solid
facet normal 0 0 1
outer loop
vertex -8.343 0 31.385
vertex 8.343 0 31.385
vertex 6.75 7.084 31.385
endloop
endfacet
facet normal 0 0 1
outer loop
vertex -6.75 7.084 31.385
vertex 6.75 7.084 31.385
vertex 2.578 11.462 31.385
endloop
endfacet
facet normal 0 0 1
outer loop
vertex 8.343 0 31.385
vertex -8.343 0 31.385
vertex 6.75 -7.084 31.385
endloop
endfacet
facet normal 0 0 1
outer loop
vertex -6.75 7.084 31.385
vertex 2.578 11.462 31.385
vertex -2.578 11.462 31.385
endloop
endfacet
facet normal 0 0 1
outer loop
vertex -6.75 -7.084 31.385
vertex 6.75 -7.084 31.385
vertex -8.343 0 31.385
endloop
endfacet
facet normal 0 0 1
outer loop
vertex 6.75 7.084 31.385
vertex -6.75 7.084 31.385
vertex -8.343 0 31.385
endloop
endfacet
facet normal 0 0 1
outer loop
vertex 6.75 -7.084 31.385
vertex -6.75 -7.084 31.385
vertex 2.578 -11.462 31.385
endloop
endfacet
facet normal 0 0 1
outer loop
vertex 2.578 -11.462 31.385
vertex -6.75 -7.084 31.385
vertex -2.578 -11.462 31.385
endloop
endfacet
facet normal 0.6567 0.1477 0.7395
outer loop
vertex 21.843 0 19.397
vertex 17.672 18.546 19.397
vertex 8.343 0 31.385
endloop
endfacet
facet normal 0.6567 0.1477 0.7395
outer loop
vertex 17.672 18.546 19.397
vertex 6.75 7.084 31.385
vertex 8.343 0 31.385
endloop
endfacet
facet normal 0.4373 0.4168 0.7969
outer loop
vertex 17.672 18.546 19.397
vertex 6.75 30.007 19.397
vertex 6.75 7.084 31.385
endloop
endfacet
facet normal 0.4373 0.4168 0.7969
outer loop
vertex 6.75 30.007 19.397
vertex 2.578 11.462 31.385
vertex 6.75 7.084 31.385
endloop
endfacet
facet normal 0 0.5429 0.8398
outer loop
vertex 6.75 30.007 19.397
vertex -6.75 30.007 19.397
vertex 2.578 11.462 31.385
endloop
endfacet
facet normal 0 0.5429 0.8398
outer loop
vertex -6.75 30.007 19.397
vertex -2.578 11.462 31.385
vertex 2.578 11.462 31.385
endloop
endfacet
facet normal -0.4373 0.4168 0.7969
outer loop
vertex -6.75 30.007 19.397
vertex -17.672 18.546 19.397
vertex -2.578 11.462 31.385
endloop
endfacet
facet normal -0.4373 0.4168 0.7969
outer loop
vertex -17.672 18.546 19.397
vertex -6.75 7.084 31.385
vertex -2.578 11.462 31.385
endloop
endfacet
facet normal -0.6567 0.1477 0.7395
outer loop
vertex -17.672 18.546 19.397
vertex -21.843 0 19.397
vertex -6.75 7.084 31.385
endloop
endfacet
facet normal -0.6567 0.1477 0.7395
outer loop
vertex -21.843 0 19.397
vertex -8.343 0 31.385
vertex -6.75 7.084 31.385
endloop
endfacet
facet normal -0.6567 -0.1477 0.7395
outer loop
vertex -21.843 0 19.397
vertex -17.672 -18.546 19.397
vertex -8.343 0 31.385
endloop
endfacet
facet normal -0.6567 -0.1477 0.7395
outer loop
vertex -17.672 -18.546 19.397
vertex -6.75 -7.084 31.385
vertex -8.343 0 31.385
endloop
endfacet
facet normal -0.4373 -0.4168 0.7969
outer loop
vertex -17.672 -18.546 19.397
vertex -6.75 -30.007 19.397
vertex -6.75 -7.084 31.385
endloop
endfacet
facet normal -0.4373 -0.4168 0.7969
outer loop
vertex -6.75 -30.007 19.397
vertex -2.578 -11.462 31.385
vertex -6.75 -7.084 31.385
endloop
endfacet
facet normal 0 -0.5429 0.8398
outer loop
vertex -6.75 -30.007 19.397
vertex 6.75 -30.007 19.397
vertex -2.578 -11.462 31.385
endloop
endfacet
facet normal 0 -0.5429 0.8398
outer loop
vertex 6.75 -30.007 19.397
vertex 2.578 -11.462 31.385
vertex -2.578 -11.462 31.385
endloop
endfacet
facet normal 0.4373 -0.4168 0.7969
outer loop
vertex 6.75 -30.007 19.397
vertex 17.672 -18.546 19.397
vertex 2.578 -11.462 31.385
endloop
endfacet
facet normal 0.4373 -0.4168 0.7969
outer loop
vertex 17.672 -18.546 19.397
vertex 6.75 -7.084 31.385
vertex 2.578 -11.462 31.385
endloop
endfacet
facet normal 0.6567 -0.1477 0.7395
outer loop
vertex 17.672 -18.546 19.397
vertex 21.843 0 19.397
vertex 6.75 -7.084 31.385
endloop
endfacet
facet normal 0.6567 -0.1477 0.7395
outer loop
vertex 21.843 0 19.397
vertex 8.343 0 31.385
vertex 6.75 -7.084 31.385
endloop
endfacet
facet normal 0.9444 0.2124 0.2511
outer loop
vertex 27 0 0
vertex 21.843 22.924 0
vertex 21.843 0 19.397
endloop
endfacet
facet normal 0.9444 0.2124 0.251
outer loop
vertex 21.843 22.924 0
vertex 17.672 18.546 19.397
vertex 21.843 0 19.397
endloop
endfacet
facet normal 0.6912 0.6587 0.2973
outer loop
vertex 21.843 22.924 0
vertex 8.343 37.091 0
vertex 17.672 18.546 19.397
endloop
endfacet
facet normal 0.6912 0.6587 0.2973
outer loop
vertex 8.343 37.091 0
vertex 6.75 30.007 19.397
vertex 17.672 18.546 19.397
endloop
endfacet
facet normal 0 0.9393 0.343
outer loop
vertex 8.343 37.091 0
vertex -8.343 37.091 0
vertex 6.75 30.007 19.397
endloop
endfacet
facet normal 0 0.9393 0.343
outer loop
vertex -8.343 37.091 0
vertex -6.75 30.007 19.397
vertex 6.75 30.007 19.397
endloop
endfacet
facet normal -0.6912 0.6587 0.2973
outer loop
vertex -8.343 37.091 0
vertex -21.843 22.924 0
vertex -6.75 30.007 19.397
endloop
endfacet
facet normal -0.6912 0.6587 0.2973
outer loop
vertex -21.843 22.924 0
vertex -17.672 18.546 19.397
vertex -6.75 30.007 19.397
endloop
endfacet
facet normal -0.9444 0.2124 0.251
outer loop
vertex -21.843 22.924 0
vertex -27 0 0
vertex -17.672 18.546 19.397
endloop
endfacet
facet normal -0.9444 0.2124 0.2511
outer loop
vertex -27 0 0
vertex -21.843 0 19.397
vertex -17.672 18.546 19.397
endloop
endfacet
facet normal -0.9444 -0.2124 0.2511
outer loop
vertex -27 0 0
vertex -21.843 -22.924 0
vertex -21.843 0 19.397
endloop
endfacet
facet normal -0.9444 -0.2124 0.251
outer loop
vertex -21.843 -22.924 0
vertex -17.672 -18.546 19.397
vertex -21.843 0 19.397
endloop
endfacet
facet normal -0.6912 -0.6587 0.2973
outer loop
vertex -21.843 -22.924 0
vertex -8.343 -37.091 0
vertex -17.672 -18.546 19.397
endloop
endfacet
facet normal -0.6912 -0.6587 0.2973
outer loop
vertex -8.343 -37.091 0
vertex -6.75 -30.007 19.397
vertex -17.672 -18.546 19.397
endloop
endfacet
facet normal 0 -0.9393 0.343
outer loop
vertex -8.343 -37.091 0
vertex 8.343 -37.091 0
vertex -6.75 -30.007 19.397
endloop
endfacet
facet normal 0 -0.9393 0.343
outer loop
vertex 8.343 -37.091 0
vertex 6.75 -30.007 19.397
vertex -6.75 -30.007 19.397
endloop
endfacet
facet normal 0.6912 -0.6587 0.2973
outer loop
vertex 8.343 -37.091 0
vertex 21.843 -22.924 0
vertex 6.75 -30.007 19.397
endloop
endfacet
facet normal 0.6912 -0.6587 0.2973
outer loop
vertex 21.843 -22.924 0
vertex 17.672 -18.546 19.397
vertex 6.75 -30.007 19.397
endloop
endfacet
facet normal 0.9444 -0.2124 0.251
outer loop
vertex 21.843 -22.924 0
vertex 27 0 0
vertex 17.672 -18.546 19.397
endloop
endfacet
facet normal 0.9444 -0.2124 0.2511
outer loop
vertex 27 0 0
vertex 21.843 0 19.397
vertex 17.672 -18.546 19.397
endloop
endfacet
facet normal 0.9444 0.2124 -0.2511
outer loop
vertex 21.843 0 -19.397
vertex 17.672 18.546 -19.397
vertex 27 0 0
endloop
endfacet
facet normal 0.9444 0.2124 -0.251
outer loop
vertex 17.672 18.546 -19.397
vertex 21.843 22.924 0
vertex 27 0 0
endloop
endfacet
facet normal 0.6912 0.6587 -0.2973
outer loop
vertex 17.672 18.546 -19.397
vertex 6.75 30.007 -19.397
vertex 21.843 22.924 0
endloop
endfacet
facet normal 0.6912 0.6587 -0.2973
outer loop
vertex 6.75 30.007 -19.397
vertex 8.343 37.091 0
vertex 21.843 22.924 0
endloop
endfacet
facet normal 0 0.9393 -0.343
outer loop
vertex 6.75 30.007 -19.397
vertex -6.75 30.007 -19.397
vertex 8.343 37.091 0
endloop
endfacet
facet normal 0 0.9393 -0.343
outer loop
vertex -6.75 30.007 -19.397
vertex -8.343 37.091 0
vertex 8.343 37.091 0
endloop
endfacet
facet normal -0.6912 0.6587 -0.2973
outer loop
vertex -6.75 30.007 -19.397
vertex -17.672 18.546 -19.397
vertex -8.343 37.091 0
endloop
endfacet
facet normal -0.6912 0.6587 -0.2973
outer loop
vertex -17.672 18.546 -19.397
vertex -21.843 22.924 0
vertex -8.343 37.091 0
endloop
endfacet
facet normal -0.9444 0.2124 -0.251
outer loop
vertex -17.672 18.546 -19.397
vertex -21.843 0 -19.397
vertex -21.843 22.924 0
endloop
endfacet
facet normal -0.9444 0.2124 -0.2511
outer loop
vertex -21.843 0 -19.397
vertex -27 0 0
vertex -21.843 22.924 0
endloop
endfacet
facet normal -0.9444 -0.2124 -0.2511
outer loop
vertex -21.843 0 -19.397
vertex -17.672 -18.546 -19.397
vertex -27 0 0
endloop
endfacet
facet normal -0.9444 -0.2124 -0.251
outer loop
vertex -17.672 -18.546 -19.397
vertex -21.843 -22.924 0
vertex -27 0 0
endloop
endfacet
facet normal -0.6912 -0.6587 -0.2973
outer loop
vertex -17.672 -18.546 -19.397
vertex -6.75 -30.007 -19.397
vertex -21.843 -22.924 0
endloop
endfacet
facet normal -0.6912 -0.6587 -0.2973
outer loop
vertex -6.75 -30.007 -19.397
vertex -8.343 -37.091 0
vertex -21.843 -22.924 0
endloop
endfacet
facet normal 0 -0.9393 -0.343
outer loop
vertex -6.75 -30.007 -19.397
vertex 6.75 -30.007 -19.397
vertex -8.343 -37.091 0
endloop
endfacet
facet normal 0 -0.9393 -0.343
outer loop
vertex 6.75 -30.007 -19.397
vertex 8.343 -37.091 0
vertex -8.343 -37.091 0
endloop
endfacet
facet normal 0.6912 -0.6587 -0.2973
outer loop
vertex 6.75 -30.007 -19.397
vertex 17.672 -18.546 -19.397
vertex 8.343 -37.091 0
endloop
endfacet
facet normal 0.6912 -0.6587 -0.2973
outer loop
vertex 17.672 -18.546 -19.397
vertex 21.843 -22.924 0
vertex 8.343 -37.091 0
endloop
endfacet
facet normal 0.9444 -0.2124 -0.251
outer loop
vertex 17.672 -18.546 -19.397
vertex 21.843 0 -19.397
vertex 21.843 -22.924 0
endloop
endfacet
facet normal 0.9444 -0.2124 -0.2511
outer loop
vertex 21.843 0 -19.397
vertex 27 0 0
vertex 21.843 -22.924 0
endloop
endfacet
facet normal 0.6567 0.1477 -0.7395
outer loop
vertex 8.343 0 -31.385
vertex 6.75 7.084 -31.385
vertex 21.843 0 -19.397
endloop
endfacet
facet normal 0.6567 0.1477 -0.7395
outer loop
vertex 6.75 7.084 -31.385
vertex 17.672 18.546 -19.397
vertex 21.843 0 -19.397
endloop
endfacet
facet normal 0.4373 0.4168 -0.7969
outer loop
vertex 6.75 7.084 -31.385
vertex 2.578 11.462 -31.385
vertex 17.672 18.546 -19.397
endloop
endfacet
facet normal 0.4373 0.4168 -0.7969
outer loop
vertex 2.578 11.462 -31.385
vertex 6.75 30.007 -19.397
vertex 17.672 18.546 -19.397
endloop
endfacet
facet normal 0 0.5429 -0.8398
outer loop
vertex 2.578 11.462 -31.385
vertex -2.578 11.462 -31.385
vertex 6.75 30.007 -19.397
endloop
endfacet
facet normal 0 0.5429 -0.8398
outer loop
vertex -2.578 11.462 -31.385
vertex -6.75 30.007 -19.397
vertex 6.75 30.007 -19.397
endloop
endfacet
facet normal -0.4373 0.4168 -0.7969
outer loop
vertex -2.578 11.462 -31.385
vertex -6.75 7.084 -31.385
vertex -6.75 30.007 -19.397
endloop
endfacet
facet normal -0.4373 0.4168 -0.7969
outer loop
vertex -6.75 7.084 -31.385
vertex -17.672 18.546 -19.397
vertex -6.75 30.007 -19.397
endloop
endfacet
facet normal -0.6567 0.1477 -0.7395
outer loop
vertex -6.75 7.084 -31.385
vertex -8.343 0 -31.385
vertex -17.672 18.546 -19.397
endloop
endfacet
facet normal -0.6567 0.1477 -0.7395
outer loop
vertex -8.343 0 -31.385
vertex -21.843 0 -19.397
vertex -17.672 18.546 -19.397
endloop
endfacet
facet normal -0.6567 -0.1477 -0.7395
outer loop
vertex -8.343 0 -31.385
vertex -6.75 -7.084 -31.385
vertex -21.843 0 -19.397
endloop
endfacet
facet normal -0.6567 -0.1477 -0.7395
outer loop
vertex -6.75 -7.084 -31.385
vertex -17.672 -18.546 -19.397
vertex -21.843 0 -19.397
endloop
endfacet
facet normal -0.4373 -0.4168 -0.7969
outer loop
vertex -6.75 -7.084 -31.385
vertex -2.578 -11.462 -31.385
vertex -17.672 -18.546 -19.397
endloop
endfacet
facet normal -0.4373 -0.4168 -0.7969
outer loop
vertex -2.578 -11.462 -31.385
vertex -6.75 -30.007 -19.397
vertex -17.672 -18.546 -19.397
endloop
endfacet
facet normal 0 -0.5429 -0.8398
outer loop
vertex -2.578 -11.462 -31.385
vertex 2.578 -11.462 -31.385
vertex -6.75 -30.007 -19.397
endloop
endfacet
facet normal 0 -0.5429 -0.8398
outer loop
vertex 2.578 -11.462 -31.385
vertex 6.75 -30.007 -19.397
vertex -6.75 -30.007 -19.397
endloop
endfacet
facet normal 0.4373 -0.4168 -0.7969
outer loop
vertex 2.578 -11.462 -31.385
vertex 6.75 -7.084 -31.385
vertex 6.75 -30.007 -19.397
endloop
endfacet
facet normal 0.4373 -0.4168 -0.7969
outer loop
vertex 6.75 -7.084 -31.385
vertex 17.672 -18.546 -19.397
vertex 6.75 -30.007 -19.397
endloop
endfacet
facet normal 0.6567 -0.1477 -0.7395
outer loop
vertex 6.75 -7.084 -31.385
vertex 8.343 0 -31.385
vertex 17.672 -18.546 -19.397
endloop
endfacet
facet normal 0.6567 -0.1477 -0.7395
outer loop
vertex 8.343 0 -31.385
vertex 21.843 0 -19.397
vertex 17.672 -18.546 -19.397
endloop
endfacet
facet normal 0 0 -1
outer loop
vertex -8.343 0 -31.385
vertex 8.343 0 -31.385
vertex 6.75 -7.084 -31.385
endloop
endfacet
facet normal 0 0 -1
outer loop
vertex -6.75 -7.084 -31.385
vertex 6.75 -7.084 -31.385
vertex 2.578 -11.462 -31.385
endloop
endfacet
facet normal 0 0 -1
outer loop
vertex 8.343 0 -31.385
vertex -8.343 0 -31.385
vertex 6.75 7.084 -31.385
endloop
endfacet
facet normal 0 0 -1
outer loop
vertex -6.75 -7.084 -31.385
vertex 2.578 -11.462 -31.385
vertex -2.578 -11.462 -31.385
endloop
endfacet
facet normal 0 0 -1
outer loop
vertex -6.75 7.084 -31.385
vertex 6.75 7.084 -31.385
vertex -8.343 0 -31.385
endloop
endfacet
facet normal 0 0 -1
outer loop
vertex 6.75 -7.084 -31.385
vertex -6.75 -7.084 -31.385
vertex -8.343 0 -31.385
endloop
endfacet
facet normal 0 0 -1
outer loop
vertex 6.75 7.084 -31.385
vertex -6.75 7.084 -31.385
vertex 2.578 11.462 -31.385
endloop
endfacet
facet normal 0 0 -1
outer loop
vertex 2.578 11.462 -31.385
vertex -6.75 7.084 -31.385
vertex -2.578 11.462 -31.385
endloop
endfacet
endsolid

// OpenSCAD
// Generated by SolidPython 1.0.1 on 2020-07-29 00:46:48


scale(v = [9, 13, 11]) {
	sphere(r = 3);
}
/***********************************************
*********      SolidPython code:      **********
************************************************
 
# import packages: SolidPython
from solid import *
from solid.utils import *
from itertools import chain, combinations, permutations


class Resize:

    def __init__(self, scad_file):
        self.scad_file = scad_file
        #self.scad_file = import_scad(scad_file)
        # cone/cylinder param:
        self.r1 = 0
        self.r2 = 0
        self.h = 0
        # rectangular prism param:
        self.w = 0
        self.l = 0
        # ellipse param:
        self.r = 0

    # import OpenScad code (file name corresponds to shape)


    # classify shape + parameters
    def assign(self, param1, param2, param3):
        if self.scad_file == 'cone.scad':
            self.r1 = param1
            self.r2 = param2
            self.h = param3
        elif self.scad_file == 'cylinder.scad':
            self.r1 = param1
            self.r2 = param2
            self.h = param3
        elif self.scad_file == 'rectangularPrism.scad':
            self.h = param1
            self.l = param2
            self.w = param3
        else:
            self.r = param1
            self.h = param2

    # resize parameters
    def iterate(self):
        x = range(3, 20, 2)
        i = 1
        if self.scad_file == 'cone.scad':
            tempList = list(permutations(x, 2))
            for temp in tempList:
                param1 = temp[0]
                param2 = temp[1]
                filepath = 'produced_scad_files/' + 'cone' + str(param1) + '_' + str(param2) + '_' + '.scad'
                scad_render_to_file(cylinder(h=param1, r1=param2, r2=0), filepath)

        elif self.scad_file == 'cylinder.scad':
            tempList = list(permutations(x, 3))
            for temp in tempList:
                param1 = temp[0]
                param2 = temp[1]
                filepath = 'produced_scad_files/' + 'cylinder' + str(param1) + '_' + str(param2) + '_' + '.scad'
                scad_render_to_file(cylinder(h=param1, r1=param2, r2=param2), filepath)

        elif self.scad_file == 'rectangularPrism.scad':
            tempList = list(permutations(x, 3))
            for temp in tempList:
                param1 = temp[0]
                param2 = temp[1]
                param3 = temp[2]
                filepath = 'produced_scad_files/' + 'rectangularPrism' + str(param1) + '_' + str(param2) + '_' + str(
                    param3) + '.scad'
                scad_render_to_file(cube(size=(param1, param2, param3)), filepath)

        elif self.scad_file == 'ellipse.scad':
            tempList = list(permutations(x, 4))
            for temp in tempList:
                param1 = temp[0]
                param2 = temp[1]
                param3 = temp[2]
                param4 = temp[3]
                filepath = 'produced_scad_files/' + 'ellipse' + str(param1) + '_' + str(param2) + '_' + str(param3) + '_' + str(param4) + '.scad'
                scad_render_to_file(scale([param1, param2, param3])(sphere(r=param4)), filepath)

    def render_to_scadfile(self):
        scad_render_to_file(scad, 'example.scad') 
 
************************************************/
